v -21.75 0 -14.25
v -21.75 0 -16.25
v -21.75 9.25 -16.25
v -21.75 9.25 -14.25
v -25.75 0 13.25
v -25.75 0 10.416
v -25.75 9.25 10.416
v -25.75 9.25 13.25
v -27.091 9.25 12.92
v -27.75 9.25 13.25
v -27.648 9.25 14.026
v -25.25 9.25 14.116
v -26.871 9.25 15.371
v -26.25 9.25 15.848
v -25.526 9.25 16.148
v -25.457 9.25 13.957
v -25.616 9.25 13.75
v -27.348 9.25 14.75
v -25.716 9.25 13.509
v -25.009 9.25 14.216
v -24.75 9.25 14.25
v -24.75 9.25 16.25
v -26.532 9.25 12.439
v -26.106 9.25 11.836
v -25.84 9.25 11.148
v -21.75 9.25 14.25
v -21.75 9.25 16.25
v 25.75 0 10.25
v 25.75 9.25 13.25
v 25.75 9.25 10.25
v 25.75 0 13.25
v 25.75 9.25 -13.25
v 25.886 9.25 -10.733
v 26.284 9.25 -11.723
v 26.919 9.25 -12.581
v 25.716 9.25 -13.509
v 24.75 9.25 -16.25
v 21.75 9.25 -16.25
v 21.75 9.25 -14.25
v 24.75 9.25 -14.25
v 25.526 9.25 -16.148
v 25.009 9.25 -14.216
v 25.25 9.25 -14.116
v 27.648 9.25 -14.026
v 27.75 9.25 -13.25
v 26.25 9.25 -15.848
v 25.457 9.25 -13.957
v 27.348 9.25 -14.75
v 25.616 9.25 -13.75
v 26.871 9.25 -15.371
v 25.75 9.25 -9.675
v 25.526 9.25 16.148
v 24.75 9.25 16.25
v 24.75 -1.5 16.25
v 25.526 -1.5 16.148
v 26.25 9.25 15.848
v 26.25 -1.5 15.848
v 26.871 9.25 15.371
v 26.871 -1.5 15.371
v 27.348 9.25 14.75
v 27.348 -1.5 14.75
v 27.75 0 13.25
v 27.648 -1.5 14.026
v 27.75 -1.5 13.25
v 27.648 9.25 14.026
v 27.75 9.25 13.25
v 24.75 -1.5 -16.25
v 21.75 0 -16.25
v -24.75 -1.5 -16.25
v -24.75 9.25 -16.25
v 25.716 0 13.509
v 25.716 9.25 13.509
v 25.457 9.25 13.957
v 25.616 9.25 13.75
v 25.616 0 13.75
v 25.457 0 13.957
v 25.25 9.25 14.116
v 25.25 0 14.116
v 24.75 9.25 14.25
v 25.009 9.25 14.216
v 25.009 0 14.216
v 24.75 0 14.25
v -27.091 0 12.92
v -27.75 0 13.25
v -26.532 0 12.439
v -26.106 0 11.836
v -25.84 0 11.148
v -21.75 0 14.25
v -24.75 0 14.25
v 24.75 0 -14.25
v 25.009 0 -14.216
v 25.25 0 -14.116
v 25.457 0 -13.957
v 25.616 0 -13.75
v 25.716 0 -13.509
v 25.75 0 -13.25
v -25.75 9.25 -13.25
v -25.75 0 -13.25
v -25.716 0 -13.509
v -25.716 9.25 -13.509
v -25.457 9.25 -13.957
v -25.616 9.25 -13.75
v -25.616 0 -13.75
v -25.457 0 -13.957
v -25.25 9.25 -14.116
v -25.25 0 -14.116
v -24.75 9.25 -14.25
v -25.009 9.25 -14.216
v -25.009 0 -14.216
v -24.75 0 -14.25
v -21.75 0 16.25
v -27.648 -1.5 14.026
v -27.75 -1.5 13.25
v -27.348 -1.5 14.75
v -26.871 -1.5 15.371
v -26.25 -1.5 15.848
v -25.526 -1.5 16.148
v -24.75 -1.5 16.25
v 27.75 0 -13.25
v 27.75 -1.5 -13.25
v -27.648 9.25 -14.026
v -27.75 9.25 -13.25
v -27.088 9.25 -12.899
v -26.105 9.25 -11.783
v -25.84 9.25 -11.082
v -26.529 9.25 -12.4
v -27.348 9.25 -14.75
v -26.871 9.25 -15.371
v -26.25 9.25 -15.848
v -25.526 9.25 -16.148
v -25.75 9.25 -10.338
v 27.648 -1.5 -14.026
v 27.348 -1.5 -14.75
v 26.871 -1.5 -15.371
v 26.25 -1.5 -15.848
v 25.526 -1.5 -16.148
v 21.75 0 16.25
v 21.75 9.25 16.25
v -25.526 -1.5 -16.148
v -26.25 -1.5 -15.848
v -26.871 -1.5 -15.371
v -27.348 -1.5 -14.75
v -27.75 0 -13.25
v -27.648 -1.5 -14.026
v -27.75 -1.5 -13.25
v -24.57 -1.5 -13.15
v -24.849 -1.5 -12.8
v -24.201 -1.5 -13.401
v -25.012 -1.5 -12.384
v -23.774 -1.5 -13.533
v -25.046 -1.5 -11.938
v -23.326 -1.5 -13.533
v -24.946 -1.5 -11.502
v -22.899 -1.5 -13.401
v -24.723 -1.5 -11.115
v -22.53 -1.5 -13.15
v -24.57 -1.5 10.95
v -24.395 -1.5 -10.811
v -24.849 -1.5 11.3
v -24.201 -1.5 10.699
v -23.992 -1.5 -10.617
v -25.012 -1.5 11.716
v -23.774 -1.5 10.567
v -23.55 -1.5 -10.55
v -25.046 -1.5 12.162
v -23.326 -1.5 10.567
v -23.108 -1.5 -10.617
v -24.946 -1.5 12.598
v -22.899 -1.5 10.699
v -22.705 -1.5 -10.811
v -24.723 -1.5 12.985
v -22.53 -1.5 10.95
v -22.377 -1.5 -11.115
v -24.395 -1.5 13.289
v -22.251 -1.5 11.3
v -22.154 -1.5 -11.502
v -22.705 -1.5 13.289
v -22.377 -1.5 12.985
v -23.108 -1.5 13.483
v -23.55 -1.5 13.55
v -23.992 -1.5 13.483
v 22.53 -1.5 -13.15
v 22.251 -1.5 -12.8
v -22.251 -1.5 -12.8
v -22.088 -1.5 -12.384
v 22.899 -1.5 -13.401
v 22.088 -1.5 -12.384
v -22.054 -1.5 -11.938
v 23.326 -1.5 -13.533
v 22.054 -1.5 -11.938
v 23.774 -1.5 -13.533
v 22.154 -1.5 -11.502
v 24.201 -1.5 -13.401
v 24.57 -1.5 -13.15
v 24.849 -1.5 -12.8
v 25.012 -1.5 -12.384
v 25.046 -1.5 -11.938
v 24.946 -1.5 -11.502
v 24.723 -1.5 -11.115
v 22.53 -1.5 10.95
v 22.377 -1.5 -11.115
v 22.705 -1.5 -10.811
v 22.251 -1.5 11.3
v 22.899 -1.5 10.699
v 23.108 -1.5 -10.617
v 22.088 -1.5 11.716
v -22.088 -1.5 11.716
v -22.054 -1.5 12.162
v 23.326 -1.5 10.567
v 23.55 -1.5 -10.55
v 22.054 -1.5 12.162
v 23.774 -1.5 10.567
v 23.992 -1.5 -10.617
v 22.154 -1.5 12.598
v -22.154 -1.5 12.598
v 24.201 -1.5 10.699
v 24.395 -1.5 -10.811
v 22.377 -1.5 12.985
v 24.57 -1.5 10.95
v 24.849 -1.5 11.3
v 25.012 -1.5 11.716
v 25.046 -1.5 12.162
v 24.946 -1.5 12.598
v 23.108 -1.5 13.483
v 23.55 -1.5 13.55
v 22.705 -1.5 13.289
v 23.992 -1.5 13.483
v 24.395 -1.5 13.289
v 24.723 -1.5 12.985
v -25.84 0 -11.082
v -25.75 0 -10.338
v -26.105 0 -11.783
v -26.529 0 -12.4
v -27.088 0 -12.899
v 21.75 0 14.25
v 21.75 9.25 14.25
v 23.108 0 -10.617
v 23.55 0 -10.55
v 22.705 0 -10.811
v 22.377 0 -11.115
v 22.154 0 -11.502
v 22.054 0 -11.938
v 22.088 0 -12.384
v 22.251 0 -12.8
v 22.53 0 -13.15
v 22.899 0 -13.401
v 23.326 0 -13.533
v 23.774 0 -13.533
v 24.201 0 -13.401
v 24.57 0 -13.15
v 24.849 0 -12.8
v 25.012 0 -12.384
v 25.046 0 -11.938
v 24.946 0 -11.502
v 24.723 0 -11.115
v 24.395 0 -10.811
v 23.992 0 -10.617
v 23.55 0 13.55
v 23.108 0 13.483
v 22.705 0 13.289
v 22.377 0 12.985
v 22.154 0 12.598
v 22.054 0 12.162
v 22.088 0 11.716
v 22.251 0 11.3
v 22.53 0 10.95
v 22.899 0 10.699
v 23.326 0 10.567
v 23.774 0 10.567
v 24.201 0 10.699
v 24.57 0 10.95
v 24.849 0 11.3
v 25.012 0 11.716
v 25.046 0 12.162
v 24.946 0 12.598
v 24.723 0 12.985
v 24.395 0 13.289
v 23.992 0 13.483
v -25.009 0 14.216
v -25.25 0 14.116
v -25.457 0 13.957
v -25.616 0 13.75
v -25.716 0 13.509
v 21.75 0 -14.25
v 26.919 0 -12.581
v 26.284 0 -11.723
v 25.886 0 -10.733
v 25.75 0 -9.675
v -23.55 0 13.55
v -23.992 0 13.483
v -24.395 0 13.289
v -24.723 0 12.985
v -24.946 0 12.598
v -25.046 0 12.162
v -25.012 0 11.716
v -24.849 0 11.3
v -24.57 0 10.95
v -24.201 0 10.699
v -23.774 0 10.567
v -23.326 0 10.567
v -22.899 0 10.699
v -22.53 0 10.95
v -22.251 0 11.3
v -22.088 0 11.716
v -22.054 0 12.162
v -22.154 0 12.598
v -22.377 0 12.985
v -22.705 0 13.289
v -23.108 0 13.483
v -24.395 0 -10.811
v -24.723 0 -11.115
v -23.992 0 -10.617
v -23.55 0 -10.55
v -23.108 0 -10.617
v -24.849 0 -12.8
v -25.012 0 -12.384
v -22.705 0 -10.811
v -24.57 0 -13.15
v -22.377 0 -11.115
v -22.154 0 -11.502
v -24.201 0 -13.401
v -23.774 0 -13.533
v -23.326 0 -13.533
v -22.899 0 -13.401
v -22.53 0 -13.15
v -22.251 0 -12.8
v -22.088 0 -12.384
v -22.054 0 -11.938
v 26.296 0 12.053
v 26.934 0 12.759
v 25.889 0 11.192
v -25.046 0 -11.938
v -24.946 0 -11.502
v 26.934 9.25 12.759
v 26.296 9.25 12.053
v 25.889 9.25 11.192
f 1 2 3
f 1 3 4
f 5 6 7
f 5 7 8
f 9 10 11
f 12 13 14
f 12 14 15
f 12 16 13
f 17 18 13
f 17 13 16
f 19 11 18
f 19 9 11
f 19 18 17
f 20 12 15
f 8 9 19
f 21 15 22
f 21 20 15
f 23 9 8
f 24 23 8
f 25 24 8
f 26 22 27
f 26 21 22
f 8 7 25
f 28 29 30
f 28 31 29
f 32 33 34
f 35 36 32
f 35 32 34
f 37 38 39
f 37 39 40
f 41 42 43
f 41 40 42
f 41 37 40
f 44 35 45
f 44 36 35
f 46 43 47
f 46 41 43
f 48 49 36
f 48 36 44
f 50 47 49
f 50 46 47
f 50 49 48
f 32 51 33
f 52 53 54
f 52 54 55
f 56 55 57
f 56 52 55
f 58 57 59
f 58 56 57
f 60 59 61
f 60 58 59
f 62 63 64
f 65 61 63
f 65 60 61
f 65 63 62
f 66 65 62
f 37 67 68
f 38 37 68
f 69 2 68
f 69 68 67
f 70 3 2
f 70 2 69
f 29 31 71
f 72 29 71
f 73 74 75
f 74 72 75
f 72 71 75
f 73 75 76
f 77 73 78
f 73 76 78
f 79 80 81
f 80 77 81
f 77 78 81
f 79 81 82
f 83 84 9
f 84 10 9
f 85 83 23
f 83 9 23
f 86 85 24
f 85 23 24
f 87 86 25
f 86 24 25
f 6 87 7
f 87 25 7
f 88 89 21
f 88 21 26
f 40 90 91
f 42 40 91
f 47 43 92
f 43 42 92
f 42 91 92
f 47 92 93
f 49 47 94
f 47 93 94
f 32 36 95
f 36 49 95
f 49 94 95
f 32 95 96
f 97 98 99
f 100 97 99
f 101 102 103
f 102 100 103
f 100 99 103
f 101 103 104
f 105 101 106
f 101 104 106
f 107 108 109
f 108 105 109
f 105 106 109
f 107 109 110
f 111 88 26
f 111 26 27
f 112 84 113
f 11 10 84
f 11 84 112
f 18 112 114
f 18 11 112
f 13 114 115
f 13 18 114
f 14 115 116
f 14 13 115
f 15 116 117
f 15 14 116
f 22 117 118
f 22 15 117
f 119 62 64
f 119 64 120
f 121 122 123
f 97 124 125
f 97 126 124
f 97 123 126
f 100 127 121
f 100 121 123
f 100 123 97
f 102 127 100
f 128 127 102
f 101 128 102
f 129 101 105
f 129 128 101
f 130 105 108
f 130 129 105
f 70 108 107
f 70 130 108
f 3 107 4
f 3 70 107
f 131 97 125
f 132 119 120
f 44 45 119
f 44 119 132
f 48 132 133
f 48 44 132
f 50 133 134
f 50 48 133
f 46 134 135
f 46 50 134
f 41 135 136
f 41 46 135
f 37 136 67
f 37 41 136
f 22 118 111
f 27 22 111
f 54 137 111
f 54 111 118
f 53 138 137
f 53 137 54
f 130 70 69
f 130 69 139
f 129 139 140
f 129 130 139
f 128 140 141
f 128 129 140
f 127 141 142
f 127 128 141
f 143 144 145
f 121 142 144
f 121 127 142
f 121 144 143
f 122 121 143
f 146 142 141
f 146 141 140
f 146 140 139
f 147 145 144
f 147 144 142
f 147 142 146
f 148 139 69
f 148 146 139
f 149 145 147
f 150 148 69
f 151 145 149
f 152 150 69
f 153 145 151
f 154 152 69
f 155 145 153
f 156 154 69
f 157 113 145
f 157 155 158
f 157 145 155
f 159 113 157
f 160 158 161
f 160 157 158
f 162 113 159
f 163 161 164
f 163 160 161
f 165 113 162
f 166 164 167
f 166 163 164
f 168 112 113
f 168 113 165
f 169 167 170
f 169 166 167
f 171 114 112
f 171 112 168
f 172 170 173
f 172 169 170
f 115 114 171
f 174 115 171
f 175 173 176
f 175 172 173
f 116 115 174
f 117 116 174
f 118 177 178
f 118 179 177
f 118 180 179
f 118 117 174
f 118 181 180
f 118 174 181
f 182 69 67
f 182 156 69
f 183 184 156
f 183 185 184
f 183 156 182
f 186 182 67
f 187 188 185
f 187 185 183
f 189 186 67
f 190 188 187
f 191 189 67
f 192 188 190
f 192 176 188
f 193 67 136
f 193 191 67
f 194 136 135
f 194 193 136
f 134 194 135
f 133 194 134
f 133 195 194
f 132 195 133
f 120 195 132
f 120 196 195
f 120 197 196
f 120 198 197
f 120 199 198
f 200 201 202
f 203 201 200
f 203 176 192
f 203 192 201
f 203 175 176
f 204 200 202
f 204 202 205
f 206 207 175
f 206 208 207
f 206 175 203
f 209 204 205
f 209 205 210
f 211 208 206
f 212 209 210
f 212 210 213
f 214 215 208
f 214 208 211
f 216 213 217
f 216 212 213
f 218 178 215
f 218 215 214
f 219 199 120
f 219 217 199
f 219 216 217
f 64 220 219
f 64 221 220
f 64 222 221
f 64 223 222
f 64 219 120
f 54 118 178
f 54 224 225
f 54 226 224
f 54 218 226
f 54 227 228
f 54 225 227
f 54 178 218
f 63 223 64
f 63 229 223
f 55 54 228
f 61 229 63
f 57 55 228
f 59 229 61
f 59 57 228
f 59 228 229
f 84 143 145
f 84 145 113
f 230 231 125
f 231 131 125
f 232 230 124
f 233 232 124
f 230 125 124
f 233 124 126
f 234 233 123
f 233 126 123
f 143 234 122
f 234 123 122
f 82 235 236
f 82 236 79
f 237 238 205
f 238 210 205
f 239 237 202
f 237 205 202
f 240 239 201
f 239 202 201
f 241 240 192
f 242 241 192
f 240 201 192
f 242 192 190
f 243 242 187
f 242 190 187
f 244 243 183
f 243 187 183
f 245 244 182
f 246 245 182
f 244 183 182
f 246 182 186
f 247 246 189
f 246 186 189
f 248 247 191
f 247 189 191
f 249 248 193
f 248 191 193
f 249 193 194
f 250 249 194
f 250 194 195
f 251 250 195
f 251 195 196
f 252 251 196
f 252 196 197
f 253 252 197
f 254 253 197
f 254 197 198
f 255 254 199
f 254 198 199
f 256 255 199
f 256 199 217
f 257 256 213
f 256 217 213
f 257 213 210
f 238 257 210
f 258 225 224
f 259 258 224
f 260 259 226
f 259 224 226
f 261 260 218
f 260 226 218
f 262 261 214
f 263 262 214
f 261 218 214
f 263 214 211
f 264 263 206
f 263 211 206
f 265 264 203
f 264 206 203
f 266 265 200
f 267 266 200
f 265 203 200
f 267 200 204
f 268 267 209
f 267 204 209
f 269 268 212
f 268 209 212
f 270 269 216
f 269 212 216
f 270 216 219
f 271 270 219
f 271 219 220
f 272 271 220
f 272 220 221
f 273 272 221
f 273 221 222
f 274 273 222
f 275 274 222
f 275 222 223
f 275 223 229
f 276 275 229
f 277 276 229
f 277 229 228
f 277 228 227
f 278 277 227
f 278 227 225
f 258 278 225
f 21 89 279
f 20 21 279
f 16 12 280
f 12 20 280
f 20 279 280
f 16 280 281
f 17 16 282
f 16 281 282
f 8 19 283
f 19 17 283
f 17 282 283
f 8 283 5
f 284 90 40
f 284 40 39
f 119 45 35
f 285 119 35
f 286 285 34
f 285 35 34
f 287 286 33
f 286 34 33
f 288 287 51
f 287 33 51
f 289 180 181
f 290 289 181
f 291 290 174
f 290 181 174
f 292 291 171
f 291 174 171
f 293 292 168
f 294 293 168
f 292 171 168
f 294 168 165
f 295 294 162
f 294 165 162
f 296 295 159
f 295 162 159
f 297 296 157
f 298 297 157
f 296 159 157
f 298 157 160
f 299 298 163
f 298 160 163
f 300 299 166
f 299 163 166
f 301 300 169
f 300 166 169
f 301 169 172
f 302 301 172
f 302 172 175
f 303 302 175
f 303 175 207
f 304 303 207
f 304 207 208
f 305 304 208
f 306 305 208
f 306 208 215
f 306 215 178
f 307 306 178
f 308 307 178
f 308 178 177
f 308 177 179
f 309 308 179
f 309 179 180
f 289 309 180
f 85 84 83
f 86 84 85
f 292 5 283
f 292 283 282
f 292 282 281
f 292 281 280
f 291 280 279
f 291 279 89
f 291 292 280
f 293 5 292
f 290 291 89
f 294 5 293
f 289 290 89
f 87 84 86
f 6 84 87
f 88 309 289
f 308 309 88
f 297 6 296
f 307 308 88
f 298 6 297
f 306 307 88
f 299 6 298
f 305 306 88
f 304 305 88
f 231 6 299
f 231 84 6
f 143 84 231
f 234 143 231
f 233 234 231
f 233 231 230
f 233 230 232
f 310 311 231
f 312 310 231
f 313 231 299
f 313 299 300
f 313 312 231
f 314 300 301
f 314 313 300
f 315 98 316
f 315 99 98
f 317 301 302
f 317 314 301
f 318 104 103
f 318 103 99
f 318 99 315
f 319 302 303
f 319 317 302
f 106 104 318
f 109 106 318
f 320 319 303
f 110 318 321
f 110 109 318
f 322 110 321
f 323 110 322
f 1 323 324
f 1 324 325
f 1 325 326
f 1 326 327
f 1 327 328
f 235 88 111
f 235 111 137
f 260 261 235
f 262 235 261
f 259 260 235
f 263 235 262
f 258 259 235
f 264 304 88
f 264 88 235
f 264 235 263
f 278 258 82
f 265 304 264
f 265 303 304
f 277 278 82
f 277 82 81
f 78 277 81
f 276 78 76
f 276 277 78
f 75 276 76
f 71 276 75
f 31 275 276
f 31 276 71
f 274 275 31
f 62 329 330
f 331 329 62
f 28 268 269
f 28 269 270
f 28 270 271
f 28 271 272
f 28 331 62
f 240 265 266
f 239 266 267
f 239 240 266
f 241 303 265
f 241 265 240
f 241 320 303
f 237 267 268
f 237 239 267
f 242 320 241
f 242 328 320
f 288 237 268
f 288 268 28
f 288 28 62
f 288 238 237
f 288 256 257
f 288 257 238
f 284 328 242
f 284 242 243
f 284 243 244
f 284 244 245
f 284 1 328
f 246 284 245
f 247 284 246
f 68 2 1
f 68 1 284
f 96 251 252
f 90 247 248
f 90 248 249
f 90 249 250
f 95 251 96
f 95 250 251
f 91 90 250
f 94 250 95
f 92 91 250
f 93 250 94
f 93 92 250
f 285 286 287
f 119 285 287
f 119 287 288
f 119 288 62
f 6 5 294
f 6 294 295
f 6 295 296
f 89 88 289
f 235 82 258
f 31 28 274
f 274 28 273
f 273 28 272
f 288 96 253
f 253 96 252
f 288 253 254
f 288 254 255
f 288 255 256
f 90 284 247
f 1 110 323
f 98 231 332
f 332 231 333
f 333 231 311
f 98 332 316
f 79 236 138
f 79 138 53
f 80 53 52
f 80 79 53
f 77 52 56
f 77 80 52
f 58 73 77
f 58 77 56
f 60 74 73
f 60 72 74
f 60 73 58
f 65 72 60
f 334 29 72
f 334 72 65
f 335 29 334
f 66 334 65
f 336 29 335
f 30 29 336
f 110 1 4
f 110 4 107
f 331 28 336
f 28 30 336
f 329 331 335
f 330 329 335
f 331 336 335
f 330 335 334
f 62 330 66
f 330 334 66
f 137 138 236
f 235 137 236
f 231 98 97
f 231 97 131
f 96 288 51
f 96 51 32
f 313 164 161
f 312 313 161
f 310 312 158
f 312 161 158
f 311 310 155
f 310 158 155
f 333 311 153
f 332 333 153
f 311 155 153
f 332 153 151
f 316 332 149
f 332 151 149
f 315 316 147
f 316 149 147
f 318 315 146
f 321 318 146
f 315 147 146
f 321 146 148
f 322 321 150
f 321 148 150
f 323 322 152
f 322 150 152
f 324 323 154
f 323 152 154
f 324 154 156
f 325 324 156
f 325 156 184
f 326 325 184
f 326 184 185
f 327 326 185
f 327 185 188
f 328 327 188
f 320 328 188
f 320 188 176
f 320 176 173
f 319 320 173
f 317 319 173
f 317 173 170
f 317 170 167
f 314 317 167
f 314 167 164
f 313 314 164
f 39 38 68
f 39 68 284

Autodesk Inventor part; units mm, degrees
ref_plane "YZ Plane" through (0, 0, 0) normal (1, 0, 0) x (0, 1, 0)
ref_plane "XZ Plane" through (0, 0, 0) normal (0, 1, 0) x (-1, 0, 0)
ref_plane "XY Plane" through (0, 0, 0) normal (0, 0, 1) x (1, 0, 0)
sketch "Sketch3" plane through (0, 0, 0) normal (0, 1, 0) x (-1, 0, 0)
  line L0 (-25.75, 13.25) -> (-25.75, -13.25)
  line L1 (-24.75, -14.25) -> (24.75, -14.25)
  line L2 (25.75, -13.25) -> (25.75, 13.25)
  line L3 (24.75, 14.25) -> (-24.75, 14.25)
  arc A0 (-25.75, -13.25) -> (-24.75, -14.25) centre (-24.75, -13.25) ccw
  arc A1 (-24.75, 14.25) -> (-25.75, 13.25) centre (-24.75, 13.25) ccw
  arc A2 (25.75, 13.25) -> (24.75, 14.25) centre (24.75, 13.25) ccw
  arc A3 (24.75, -14.25) -> (25.75, -13.25) centre (24.75, -13.25) ccw
  line L4 (24.75, -16.25) -> (-24.75, -16.25)
  arc A4 (-27.75, -13.25) -> (-24.75, -16.25) centre (-24.75, -13.25) ccw
  line L5 (-27.75, -13.25) -> (-27.75, 13.25)
  arc A5 (-24.75, 16.25) -> (-27.75, 13.25) centre (-24.75, 13.25) ccw
  line L6 (-24.75, 16.25) -> (24.75, 16.25)
  arc A6 (27.75, 13.25) -> (24.75, 16.25) centre (24.75, 13.25) ccw
  line L7 (27.75, 13.25) -> (27.75, -13.25)
  arc A7 (24.75, -16.25) -> (27.75, -13.25) centre (24.75, -13.25) ccw
  line L8 (21.75, -16.25) -> (21.75, -14.25)
  line L9 (27.75, -10.25) -> (25.75, -10.25)
  line L10 (25.75, 10.25) -> (27.75, 10.25)
  line L11 (21.75, 14.25) -> (21.75, 16.25)
  line L12 (-21.75, 14.25) -> (-21.75, 16.25)
  line L13 (-25.75, 10.25) -> (-27.75, 10.25)
  line L14 (-25.75, -10.25) -> (-27.75, -10.25)
  line L15 (-21.75, -16.25) -> (-21.75, -14.25)
  line L16 (-21.75, -14.25) -> (-17.75, -14.25)
  arc A8 (-17.75, -14.25) -> (-21.75, -16.25) centre (-15.3911, -23.9678) ccw
  line L17 (-21.75, 14.25) -> (-17.75, 14.25)
  arc A9 (-21.75, 16.25) -> (-17.75, 14.25) centre (-15.3911, 23.9678) ccw
  line L18 (-25.75, -10.25) -> (-25.75, -6.2495)
  line L19 (-25.75, 10.25) -> (-25.75, 6.25)
  arc A10 (-27.75, -10.25) -> (-25.75, -6.2495) centre (-35.468, -3.8913) ccw
  arc A11 (-25.75, 6.25) -> (-27.75, 10.25) centre (-35.4678, 3.8911) ccw
  line L20 (25.75, -10.25) -> (25.75, -6.2495)
  arc A12 (25.75, -6.2495) -> (27.75, -10.25) centre (35.468, -3.8913) ccw
  line L21 (25.75, 10.25) -> (25.75, 6.25)
  arc A13 (27.75, 10.25) -> (25.75, 6.25) centre (35.4678, 3.8911) ccw
  point P0 (0, 0)
  point P1 (0, 0)
  point P2 (-25.75, 14.25)
  point P3 (-25.75, -14.25)
  point P4 (25.75, -14.25)
  point P5 (21.75, 15.25)
  point P6 (-26.75, 10.25)
  dimension "d8" = 28.5
  dimension "d9" = 51.5
  dimension "d10" = 14.25
  dimension "d11" = 25.75
  dimension "d12" = 1
  dimension "d13" = 2
  dimension "d14" = 3
  dimension "d15" = 3
  dimension "d16" = 3
  dimension "d17" = 3
  dimension "d18" = 3
  dimension "d19" = 3
  dimension "d20" = 3
  dimension "d21" = 3
  dimension "d22" = 4
  dimension "d23" = 10
  dimension "d24" = 10
  dimension "d25" = 4
  dimension "d26" = 10
  dimension "d27" = 10
  dimension "d28" = 10
  dimension "d29" = 10
extrude "Extrusion2" add sketch "Sketch3" along normal blind 3 contours L0 L13 L5 A5 L6 L12 L3 A1 | L0 A11 L13 | L12 A9 L3 | L0 L14 A10 | L14 L0 A0 L1 L15 L4 A4 L5 | L11 L6 A6 L7 L10 L2 A2 L3 | L15 L1 A8 | L8 L1 A3 L2 L9 L7 A7 L4 | L10 A13 L2 | L9 L2 A12
sketch "Sketch4" plane through (0, 0, 0) normal (0, -1, 0) x (1, 0, 0)
  line L0 (-27.75, -13.25) -> (-27.75, -10.25) projected
  arc A0 (-27.75, -13.25) -> (-24.75, -16.25) centre (-24.75, -13.25) ccw projected
  line L1 (-21.75, -16.25) -> (-24.75, -16.25) projected
  line L2 (-24.75, 16.25) -> (-21.75, 16.25) projected
  arc A1 (-24.75, 16.25) -> (-27.75, 13.25) centre (-24.75, 13.25) ccw projected
  line L3 (-27.75, 10.25) -> (-27.75, 13.25) projected
  line L4 (21.75, 16.25) -> (24.75, 16.25) projected
  arc A2 (27.75, 13.25) -> (24.75, 16.25) centre (24.75, 13.25) ccw projected
  line L5 (27.75, 13.25) -> (27.75, 10.25) projected
  line L6 (27.75, -10.25) -> (27.75, -13.25) projected
  arc A3 (24.75, -16.25) -> (27.75, -13.25) centre (24.75, -13.25) ccw projected
  line L7 (24.75, -16.25) -> (21.75, -16.25) projected
  line L8 (-21.75, -16.25) -> (21.75, -16.25)
  line L9 (-27.75, -10.25) -> (-27.75, 10.25)
  line L10 (-25.75, -6.2495) -> (-25.75, -13.25) projected
  line L11 (-21.75, 16.25) -> (-21.75, 14.25) projected
  arc A4 (17.75, 14.25) -> (21.75, 16.25) centre (15.3911, 23.9678) ccw projected
  line L12 (-21.75, 16.25) -> (21.75, 16.25)
  arc A5 (25.75, -6.2495) -> (27.75, -10.25) centre (35.468, -3.8913) ccw projected
  line L13 (27.75, 10.25) -> (27.75, -10.25)
  point P0 (0, 0)
extrude "Extrusion3" add sketch "Sketch4" along normal blind 1.5
sketch "Sketch5" plane through (0, 0, 0) normal (0, 1, 0) x (1, 0, 0)
  line L0 (-21.75, -14.25) -> (-24.75, -14.25) projected
  line L1 (-24.75, -14.25) -> (-24.75, -12.05)
  line L2 (-24.75, -12.05) -> (-23.55, -12.05)
  line L3 (-24.75, 14.25) -> (-21.75, 14.25) projected
  line L4 (-24.75, 14.25) -> (-24.75, 12.05)
  line L5 (-24.75, 12.05) -> (-23.55, 12.05)
  arc A0 (25.75, 13.25) -> (24.75, 14.25) centre (24.75, 13.25) ccw projected
  line L6 (24.75, 14.25) -> (24.75, 12.05)
  line L7 (24.75, 12.05) -> (23.55, 12.05)
  arc A1 (24.75, -14.25) -> (25.75, -13.25) centre (24.75, -13.25) ccw projected
  line L8 (24.75, -14.25) -> (24.75, -12.05)
  line L9 (24.75, -12.05) -> (23.55, -12.05)
  point P0 (0, 0)
  dimension "d34" = 2.2
  dimension "d35" = 1.2
  dimension "d36" = 2.2
  dimension "d37" = 2.2
  dimension "d38" = 1.2
  dimension "d39" = 2.2
hole "Hole1" at (-23.55, 0, 12.05) at (-23.55, 0, -12.05) at (23.55, 0, -12.05) at (23.55, 0, 12.05) direction (0, -1, 0) diameter 3 end through all
sketch "Sketch6" plane through (0, 3, 0) normal (0, 1, 0) x (1, 0, 0)
  line L0 (25.75, -6.25) -> (25.75, 6.152)
  line L1 (24.75, -14.25) -> (17.75, -14.25) projected
  line L2 (17.75, -14.25) -> (-21.75, -14.25)
  arc A0 (-25.75, 6.2495) -> (-27.75, 10.25) centre (-35.468, 3.8913) ccw projected
  line L3 (-25.75, -6.25) -> (-25.75, 6.2495)
  line L4 (-24.75, 14.25) -> (-21.75, 14.25) projected
  line L5 (-21.75, 14.25) -> (17.75, 14.25)
  line L6 (25.75, -6.25) -> (25.75, -13.25) projected
  arc A1 (24.75, -16.25) -> (27.75, -13.25) centre (24.75, -13.25) ccw projected
  arc A2 (25.75, -10.25) -> (27.75, -13.25) centre (29, -10.25) ccw
  line L7 (25.75, -6.25) -> (25.75, -13.25) projected
  line L8 (25.75, 13.25) -> (25.75, 6.2495) projected
  arc A3 (27.75, 10.25) -> (25.75, 6.2495) centre (35.468, 3.8913) ccw projected
  line L9 (27.75, 10.25) -> (27.75, 13.25) projected
  line L10 (17.75, 14.25) -> (24.75, 14.25) projected
  arc A4 (17.75, 14.25) -> (21.75, 16.25) centre (15.3911, 23.9678) ccw projected
  line L11 (24.75, 16.25) -> (21.75, 16.25) projected
  line L12 (-27.75, 13.25) -> (-27.75, 10.25) projected
  arc A5 (-25.75, 6.2495) -> (-27.75, 10.25) centre (-35.468, 3.8913) ccw projected
  line L13 (-25.75, 6.2495) -> (-25.75, 13.25) projected
  line L14 (-21.75, 14.25) -> (-21.75, 16.25) projected
  line L15 (-21.75, 16.25) -> (-24.75, 16.25) projected
  arc A6 (-27.75, -10.25) -> (-25.75, -6.25) centre (-35.4678, -3.8911) ccw projected
  line L16 (-25.75, -13.25) -> (-25.75, -6.25) projected
  line L17 (-27.75, -10.25) -> (-27.75, -13.25) projected
  arc A7 (-27.75, -13.25) -> (-24.75, -16.25) centre (-24.75, -13.25) ccw projected
  line L18 (-24.75, -16.25) -> (-21.75, -16.25) projected
  line L19 (-21.75, -16.25) -> (-21.75, -14.25) projected
  arc A8 (21.75, -16.25) -> (17.75, -14.25) centre (15.3911, -23.9678) ccw projected
  line L20 (21.75, -16.25) -> (21.75, -14.25)
  arc A9 (-27.75, -13.25) -> (-25.75, -10.4161) centre (-28.7577, -10.4161) ccw
  arc A10 (27.75, 13.25) -> (25.75, 9.6748) centre (29.9455, 9.6748) ccw
  arc A11 (-25.75, 10.3378) -> (-27.75, 13.25) centre (-28.8703, 10.3378) ccw
  line L21 (21.75, 16.25) -> (21.75, 14.25)
  line L22 (27.75, -13.25) -> (27.75, -10.25) projected
  arc A12 (25.75, -6.25) -> (27.75, -10.25) centre (35.4678, -3.8911) ccw projected
  point P0 (0, 0)
extrude "Extrusion4" cut sketch "Sketch6" against normal blind 3
sketch "Sketch7" plane through (0, 3, 0) normal (0, 1, 0) x (1, 0, 0)
  arc A0 (25.75, -10.25) -> (27.75, -13.25) centre (29, -10.25) ccw projected
  arc A1 (24.75, -16.25) -> (27.75, -13.25) centre (24.75, -13.25) ccw projected
  arc A2 (24.75, -14.25) -> (25.75, -13.25) centre (24.75, -13.25) ccw projected
  line L0 (25.75, -10.25) -> (25.75, -13.25) projected
  line L1 (24.75, -14.25) -> (21.75, -14.25) projected
  line L2 (21.75, -14.25) -> (21.75, -16.25) projected
  line L3 (21.75, -16.25) -> (24.75, -16.25) projected
  line L4 (-21.75, -14.25) -> (-24.75, -14.25) projected
  line L5 (-21.75, -16.25) -> (-21.75, -14.25) projected
  line L6 (-24.75, -16.25) -> (-21.75, -16.25) projected
  arc A3 (-27.75, -13.25) -> (-24.75, -16.25) centre (-24.75, -13.25) ccw projected
  arc A4 (-27.75, -13.25) -> (-25.75, -10.4161) centre (-28.7577, -10.4161) ccw projected
  line L7 (-25.75, -13.25) -> (-25.75, -10.4161) projected
  arc A5 (-25.75, -13.25) -> (-24.75, -14.25) centre (-24.75, -13.25) ccw projected
  arc A6 (-25.75, 10.3378) -> (-27.75, 13.25) centre (-28.8703, 10.3378) ccw projected
  line L8 (-25.75, 10.3378) -> (-25.75, 13.25) projected
  arc A7 (-24.75, 14.25) -> (-25.75, 13.25) centre (-24.75, 13.25) ccw projected
  line L9 (-24.75, 14.25) -> (-21.75, 14.25) projected
  line L10 (-21.75, 14.25) -> (-21.75, 16.25) projected
  line L11 (-21.75, 16.25) -> (-24.75, 16.25) projected
  arc A8 (-24.75, 16.25) -> (-27.75, 13.25) centre (-24.75, 13.25) ccw projected
  arc A9 (27.75, 13.25) -> (24.75, 16.25) centre (24.75, 13.25) ccw projected
  line L12 (24.75, 16.25) -> (21.75, 16.25) projected
  line L13 (21.75, 16.25) -> (21.75, 14.25) projected
  line L14 (21.75, 14.25) -> (24.75, 14.25) projected
  arc A10 (25.75, 13.25) -> (24.75, 14.25) centre (24.75, 13.25) ccw projected
  line L15 (25.75, 13.25) -> (25.75, 9.6748) projected
  arc A11 (27.75, 13.25) -> (25.75, 9.6748) centre (29.9455, 9.6748) ccw projected
  point P0 (0, 0)
extrude "Extrusion5" add sketch "Sketch7" along normal blind 6.25
